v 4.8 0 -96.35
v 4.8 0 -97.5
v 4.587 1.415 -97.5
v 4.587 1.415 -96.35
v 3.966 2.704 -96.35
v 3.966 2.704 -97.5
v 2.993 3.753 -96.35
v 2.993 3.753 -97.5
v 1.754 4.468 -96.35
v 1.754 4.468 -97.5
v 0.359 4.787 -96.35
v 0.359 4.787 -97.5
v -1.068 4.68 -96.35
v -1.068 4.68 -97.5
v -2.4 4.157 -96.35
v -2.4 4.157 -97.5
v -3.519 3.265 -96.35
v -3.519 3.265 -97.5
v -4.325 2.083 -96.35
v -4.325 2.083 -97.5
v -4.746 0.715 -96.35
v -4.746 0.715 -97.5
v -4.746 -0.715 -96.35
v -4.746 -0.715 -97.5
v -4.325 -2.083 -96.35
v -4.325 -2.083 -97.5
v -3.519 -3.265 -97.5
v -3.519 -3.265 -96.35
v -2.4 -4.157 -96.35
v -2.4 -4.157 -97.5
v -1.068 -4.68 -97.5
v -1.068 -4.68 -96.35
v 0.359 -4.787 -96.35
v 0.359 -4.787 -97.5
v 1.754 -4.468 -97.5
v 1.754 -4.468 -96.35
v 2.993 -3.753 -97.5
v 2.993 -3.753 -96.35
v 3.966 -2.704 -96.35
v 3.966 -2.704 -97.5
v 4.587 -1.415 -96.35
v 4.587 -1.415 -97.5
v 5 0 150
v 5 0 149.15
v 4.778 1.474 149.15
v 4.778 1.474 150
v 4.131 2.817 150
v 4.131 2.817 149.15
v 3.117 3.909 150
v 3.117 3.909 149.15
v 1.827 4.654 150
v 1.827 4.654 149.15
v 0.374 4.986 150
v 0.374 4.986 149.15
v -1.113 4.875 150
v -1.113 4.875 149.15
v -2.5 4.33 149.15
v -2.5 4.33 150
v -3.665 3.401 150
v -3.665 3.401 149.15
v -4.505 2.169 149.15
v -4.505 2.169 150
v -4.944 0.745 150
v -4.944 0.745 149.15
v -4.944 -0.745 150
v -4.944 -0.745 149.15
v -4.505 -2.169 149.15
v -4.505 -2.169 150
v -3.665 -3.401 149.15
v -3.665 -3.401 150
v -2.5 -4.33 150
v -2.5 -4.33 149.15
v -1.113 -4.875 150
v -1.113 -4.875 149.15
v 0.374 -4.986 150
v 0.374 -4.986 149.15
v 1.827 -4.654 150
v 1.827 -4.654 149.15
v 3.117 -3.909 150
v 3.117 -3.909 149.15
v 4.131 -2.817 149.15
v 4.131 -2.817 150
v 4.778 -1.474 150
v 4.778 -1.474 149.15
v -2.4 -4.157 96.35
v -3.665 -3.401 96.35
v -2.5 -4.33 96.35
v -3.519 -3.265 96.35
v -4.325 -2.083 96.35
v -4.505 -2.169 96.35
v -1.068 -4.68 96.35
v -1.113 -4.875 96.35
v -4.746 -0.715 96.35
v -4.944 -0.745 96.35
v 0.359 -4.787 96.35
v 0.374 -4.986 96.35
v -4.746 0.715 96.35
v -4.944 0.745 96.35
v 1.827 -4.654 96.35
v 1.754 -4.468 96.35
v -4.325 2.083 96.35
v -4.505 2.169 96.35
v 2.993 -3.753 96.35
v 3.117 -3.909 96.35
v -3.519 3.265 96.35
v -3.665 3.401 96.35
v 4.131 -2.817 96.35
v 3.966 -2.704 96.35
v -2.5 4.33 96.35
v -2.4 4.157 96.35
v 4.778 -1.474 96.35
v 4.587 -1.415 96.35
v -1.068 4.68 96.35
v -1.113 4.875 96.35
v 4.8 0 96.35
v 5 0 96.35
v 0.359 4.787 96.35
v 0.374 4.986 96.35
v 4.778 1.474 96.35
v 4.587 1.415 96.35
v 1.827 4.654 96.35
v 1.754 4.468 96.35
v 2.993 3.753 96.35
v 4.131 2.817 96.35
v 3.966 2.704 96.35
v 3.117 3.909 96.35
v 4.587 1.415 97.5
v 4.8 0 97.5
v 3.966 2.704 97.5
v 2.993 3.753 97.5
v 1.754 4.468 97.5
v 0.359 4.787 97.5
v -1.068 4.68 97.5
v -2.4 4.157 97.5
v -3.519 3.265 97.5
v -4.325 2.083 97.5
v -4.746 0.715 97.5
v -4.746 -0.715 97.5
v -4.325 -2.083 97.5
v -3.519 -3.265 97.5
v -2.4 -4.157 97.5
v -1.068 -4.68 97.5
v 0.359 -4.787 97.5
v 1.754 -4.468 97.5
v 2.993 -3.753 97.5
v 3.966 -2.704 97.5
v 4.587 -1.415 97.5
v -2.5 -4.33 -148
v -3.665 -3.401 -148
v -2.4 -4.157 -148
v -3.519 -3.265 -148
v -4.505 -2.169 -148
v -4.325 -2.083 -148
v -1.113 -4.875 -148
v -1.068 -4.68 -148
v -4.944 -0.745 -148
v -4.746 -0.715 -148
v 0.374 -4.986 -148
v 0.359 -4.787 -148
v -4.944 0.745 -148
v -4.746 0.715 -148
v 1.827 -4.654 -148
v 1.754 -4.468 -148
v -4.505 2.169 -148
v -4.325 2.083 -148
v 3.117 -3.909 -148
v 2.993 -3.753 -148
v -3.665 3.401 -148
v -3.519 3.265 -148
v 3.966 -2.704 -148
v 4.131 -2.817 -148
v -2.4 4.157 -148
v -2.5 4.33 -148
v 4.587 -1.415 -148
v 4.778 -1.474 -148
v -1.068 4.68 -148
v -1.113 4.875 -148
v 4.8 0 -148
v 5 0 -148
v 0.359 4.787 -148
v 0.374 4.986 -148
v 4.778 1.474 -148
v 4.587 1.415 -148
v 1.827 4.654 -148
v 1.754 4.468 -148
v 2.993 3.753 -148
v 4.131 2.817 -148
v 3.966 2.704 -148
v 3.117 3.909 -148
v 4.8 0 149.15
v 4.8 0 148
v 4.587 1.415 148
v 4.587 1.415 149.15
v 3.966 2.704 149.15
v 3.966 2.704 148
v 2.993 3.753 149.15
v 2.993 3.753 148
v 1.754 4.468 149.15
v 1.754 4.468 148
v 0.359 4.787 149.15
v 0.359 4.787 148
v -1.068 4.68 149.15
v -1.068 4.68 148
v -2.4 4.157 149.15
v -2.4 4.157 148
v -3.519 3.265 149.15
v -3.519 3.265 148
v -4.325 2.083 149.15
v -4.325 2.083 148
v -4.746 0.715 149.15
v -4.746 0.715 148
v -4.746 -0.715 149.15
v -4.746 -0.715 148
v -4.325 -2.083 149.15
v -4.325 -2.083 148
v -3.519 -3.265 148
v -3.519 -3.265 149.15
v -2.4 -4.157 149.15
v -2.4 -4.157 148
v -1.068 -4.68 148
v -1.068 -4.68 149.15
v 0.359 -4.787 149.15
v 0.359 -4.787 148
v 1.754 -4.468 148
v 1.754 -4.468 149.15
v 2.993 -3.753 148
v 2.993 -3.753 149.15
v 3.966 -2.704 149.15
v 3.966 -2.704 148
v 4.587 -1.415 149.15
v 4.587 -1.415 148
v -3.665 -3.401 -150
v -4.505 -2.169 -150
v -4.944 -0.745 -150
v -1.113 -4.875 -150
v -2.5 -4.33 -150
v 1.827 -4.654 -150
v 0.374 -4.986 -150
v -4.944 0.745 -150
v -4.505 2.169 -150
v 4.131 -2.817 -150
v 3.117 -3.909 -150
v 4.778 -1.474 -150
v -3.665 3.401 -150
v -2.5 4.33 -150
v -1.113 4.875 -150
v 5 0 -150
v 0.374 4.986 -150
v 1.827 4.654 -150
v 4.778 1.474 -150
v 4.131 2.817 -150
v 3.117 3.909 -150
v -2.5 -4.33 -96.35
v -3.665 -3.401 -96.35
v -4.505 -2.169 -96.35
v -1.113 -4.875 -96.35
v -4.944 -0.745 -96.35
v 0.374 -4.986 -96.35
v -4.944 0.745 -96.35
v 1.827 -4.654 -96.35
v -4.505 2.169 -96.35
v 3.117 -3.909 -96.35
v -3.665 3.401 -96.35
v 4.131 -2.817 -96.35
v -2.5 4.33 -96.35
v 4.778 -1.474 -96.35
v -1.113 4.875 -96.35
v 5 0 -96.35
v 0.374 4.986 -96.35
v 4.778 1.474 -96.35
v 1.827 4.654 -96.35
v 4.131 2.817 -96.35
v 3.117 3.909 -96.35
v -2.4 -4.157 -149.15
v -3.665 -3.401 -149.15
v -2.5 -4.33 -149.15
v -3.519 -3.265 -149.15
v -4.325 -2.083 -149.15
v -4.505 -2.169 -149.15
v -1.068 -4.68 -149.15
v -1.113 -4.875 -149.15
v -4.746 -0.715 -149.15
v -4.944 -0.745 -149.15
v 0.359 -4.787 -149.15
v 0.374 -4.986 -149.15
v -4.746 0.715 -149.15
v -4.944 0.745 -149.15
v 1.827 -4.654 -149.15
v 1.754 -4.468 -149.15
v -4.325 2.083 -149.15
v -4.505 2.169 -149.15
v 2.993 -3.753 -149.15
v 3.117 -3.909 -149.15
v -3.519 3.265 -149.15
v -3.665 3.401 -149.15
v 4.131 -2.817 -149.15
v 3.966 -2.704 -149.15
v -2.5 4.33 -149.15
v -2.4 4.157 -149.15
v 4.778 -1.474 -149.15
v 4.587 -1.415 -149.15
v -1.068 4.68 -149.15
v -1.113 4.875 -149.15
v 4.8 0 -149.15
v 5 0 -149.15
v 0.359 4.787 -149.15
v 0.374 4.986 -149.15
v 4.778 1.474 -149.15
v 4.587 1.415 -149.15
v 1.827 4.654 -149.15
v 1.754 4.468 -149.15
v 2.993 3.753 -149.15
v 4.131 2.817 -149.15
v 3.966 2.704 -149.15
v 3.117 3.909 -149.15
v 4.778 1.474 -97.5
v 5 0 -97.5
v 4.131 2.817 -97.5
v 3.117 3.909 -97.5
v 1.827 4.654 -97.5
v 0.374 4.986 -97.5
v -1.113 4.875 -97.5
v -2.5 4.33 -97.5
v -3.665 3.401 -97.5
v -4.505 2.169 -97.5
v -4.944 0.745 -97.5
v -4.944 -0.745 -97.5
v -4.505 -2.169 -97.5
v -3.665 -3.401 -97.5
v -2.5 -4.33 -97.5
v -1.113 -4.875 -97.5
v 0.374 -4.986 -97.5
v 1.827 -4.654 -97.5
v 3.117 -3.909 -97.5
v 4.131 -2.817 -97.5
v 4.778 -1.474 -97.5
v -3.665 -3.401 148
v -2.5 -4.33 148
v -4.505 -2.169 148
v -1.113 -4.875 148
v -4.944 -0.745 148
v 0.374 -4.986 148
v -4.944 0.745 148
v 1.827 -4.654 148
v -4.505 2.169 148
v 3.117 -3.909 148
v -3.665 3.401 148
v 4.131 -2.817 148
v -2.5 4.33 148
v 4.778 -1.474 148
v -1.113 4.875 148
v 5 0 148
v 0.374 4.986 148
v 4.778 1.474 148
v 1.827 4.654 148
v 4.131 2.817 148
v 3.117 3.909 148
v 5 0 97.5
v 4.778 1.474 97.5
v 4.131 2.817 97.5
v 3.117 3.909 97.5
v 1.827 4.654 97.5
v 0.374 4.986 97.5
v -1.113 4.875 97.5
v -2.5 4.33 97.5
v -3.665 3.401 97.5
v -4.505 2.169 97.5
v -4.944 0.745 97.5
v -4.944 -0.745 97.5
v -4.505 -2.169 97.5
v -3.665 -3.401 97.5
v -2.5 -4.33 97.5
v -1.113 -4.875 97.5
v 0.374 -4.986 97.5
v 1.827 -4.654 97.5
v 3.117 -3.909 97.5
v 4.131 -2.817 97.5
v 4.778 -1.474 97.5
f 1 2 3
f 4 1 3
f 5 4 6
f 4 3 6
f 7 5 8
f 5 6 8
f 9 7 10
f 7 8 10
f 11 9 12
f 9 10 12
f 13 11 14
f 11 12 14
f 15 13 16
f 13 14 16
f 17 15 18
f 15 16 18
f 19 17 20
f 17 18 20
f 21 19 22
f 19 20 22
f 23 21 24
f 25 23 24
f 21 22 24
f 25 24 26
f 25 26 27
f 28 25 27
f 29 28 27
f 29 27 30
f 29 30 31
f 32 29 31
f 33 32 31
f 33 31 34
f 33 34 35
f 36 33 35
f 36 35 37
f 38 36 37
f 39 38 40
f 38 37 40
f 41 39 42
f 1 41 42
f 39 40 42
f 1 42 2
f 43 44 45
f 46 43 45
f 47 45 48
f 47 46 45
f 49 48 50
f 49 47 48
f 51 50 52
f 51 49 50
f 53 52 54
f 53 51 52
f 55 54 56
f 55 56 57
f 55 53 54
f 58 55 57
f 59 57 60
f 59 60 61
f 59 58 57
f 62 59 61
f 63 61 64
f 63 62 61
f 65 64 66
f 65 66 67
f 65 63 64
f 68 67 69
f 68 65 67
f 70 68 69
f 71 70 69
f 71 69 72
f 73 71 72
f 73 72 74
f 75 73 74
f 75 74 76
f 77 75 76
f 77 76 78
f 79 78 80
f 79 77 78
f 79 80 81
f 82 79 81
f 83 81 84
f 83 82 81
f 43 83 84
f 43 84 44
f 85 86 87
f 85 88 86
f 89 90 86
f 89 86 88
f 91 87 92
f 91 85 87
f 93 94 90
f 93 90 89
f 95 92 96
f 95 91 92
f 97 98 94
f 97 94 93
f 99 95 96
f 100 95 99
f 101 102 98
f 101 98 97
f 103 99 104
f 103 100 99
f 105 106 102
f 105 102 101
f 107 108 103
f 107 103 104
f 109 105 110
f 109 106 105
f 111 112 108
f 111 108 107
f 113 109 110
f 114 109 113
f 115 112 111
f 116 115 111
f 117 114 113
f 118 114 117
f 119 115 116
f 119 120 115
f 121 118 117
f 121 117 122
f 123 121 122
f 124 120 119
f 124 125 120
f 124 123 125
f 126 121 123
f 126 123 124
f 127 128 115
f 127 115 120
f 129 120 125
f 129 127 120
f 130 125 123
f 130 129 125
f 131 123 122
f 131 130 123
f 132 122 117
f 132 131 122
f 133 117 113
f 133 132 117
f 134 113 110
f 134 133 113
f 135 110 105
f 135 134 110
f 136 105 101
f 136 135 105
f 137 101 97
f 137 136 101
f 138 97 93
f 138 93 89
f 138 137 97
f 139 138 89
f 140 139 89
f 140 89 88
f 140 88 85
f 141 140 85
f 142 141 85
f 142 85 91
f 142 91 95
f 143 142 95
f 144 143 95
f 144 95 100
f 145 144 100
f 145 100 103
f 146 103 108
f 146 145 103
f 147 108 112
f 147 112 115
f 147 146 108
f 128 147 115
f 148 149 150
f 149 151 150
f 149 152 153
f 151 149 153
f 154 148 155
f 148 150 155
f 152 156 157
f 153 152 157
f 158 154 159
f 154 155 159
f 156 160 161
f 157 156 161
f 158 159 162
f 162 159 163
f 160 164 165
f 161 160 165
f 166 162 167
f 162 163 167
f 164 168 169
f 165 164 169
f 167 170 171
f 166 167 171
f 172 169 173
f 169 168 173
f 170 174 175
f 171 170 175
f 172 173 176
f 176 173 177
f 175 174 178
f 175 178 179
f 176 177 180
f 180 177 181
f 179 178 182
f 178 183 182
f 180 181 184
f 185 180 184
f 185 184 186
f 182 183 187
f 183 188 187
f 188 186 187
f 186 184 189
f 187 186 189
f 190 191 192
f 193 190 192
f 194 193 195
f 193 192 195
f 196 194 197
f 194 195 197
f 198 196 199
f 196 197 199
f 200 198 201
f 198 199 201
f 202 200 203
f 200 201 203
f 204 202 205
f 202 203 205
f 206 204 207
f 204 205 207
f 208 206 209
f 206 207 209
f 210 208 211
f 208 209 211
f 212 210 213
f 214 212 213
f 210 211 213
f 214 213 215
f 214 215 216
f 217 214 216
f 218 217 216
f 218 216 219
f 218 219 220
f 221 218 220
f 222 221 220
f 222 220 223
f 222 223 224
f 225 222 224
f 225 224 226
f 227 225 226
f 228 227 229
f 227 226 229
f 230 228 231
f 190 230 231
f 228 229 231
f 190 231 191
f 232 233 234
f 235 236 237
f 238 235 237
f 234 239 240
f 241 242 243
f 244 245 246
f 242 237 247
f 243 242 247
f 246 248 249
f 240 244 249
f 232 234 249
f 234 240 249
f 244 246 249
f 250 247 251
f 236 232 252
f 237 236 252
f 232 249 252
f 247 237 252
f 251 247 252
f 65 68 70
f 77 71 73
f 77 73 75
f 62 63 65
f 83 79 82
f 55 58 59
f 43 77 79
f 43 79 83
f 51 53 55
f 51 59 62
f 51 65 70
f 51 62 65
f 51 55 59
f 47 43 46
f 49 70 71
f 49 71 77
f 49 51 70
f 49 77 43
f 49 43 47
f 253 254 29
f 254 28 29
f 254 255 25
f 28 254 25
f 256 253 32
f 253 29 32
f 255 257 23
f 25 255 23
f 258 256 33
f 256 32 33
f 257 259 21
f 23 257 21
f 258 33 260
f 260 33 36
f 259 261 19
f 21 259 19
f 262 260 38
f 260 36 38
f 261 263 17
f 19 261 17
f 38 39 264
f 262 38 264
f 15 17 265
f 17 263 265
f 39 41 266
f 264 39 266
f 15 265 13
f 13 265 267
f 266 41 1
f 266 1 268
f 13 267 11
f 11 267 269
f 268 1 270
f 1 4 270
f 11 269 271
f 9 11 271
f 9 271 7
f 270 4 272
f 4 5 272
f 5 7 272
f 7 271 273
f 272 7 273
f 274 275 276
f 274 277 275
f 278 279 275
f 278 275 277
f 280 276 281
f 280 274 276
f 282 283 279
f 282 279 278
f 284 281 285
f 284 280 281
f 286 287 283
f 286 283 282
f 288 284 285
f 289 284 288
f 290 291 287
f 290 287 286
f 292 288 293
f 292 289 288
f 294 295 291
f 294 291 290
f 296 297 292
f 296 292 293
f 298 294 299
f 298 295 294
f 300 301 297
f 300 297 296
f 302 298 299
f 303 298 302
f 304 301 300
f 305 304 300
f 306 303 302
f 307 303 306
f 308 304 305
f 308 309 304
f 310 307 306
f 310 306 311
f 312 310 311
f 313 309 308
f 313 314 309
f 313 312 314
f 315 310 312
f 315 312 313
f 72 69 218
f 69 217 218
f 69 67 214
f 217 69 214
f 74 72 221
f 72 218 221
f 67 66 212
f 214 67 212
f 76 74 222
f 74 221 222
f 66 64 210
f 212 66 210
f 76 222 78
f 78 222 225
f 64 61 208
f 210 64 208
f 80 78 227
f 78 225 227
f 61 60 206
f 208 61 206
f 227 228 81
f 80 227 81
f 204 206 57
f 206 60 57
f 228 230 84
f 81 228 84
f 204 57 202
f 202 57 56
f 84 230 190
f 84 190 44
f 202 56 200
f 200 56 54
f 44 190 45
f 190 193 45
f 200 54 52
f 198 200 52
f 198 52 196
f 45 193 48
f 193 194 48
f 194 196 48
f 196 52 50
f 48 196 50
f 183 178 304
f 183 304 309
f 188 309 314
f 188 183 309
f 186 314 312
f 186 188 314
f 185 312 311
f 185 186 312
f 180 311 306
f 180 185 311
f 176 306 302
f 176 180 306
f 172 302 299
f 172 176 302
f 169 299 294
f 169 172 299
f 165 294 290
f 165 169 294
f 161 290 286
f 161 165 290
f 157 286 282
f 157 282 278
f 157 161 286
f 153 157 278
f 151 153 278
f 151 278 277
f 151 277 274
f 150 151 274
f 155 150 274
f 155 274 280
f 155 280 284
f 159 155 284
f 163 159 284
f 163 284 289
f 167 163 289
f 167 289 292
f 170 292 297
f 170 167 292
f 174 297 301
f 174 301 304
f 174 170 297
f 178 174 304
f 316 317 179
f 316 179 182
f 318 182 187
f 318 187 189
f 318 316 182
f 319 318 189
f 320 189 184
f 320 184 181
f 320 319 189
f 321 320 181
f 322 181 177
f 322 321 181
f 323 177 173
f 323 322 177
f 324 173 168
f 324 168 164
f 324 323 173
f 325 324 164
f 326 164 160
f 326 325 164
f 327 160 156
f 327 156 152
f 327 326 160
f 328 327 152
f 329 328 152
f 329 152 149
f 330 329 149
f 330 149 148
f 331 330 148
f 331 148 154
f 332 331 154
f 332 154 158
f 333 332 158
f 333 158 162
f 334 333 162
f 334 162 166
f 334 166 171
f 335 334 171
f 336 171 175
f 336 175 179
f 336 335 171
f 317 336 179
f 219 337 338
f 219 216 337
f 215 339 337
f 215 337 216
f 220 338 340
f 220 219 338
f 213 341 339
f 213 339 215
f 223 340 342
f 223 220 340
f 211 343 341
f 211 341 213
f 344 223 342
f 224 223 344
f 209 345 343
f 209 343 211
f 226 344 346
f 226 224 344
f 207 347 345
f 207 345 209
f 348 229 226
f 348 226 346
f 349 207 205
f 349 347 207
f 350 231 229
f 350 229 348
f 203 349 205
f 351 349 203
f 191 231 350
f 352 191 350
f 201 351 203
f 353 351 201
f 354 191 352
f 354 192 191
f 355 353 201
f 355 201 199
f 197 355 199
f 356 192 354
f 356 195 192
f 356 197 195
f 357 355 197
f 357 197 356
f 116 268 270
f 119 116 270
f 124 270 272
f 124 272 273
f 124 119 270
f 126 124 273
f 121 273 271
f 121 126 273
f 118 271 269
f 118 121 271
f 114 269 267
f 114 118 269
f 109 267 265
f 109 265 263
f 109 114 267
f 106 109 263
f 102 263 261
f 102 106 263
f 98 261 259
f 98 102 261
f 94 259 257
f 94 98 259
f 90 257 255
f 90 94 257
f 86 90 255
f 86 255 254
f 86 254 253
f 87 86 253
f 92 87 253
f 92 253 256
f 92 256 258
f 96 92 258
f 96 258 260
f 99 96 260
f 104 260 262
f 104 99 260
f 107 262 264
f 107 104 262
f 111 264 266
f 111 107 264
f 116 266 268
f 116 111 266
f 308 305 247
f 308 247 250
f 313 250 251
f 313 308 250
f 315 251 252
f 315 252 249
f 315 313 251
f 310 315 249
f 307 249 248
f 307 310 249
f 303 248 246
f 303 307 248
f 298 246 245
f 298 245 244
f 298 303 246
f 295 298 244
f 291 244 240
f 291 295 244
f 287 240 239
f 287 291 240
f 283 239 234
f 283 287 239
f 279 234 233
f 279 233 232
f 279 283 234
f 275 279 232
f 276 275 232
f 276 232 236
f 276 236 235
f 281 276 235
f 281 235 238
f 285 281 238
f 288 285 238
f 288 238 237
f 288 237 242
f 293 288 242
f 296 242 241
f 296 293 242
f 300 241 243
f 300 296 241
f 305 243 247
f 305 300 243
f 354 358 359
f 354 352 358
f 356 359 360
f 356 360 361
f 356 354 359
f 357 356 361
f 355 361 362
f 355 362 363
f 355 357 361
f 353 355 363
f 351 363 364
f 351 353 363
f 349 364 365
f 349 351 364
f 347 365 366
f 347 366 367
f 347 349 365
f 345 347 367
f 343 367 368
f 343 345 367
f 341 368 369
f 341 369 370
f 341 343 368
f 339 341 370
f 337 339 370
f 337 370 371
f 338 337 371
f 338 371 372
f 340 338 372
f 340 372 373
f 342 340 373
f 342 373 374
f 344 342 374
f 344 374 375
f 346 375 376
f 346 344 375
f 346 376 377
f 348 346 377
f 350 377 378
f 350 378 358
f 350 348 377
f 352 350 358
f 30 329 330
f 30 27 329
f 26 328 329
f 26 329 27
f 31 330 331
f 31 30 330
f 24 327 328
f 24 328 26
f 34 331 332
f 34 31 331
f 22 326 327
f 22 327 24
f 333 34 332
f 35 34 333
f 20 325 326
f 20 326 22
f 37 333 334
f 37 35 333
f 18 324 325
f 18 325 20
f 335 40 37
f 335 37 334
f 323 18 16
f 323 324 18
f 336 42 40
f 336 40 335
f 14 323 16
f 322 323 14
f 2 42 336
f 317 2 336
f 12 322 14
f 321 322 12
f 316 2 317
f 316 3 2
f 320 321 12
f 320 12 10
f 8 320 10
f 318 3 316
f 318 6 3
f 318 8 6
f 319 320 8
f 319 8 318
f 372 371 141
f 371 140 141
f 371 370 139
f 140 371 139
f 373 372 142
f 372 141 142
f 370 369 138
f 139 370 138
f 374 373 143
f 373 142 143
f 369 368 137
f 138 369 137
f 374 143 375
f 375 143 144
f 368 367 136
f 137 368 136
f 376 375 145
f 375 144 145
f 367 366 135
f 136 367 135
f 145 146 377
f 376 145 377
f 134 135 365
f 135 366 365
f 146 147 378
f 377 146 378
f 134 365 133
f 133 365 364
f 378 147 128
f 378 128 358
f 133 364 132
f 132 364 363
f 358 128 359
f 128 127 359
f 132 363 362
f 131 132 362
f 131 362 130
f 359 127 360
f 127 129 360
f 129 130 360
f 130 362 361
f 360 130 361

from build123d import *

# Parameters (mm, degrees)
SKETCH1_R           = 5
BOSS_EXTRUDE1_DEPTH = 150
SKETCH2_R           = 5
SKETCH2_R_2         = 4.8
CUT_EXTRUDE1_DEPTH  = 1.15
SKETCH3_R           = 5
SKETCH3_R_2         = 4.8
CUT_EXTRUDE2_DEPTH  = 1.15


with BuildPart() as part:
    # Sketch1 → Boss-Extrude1 (new, symmetric)
    with BuildSketch(Plane.XY):
        Circle(SKETCH1_R)
    extrude(amount=BOSS_EXTRUDE1_DEPTH, both=True)

    # Sketch2 → Cut-Extrude1 (cut)
    with BuildSketch(Plane.XY.offset(148)):
        Circle(SKETCH2_R)
        Circle(SKETCH2_R_2, mode=Mode.SUBTRACT)
    cut_extrude1 = extrude(amount=CUT_EXTRUDE1_DEPTH, mode=Mode.SUBTRACT)

    # Sketch3 → Cut-Extrude2 (cut)
    with BuildSketch(Plane.XY.offset(97.5)):
        Circle(SKETCH3_R)
        Circle(SKETCH3_R_2, mode=Mode.SUBTRACT)
    cut_extrude2 = extrude(amount=-CUT_EXTRUDE2_DEPTH, mode=Mode.SUBTRACT)

    # Mirror1: Cut-Extrude1, Cut-Extrude2 across plane
    add(cut_extrude1.mirror(Plane.XY), mode=Mode.SUBTRACT)
    add(cut_extrude2.mirror(Plane.XY), mode=Mode.SUBTRACT)


solid = part.part
